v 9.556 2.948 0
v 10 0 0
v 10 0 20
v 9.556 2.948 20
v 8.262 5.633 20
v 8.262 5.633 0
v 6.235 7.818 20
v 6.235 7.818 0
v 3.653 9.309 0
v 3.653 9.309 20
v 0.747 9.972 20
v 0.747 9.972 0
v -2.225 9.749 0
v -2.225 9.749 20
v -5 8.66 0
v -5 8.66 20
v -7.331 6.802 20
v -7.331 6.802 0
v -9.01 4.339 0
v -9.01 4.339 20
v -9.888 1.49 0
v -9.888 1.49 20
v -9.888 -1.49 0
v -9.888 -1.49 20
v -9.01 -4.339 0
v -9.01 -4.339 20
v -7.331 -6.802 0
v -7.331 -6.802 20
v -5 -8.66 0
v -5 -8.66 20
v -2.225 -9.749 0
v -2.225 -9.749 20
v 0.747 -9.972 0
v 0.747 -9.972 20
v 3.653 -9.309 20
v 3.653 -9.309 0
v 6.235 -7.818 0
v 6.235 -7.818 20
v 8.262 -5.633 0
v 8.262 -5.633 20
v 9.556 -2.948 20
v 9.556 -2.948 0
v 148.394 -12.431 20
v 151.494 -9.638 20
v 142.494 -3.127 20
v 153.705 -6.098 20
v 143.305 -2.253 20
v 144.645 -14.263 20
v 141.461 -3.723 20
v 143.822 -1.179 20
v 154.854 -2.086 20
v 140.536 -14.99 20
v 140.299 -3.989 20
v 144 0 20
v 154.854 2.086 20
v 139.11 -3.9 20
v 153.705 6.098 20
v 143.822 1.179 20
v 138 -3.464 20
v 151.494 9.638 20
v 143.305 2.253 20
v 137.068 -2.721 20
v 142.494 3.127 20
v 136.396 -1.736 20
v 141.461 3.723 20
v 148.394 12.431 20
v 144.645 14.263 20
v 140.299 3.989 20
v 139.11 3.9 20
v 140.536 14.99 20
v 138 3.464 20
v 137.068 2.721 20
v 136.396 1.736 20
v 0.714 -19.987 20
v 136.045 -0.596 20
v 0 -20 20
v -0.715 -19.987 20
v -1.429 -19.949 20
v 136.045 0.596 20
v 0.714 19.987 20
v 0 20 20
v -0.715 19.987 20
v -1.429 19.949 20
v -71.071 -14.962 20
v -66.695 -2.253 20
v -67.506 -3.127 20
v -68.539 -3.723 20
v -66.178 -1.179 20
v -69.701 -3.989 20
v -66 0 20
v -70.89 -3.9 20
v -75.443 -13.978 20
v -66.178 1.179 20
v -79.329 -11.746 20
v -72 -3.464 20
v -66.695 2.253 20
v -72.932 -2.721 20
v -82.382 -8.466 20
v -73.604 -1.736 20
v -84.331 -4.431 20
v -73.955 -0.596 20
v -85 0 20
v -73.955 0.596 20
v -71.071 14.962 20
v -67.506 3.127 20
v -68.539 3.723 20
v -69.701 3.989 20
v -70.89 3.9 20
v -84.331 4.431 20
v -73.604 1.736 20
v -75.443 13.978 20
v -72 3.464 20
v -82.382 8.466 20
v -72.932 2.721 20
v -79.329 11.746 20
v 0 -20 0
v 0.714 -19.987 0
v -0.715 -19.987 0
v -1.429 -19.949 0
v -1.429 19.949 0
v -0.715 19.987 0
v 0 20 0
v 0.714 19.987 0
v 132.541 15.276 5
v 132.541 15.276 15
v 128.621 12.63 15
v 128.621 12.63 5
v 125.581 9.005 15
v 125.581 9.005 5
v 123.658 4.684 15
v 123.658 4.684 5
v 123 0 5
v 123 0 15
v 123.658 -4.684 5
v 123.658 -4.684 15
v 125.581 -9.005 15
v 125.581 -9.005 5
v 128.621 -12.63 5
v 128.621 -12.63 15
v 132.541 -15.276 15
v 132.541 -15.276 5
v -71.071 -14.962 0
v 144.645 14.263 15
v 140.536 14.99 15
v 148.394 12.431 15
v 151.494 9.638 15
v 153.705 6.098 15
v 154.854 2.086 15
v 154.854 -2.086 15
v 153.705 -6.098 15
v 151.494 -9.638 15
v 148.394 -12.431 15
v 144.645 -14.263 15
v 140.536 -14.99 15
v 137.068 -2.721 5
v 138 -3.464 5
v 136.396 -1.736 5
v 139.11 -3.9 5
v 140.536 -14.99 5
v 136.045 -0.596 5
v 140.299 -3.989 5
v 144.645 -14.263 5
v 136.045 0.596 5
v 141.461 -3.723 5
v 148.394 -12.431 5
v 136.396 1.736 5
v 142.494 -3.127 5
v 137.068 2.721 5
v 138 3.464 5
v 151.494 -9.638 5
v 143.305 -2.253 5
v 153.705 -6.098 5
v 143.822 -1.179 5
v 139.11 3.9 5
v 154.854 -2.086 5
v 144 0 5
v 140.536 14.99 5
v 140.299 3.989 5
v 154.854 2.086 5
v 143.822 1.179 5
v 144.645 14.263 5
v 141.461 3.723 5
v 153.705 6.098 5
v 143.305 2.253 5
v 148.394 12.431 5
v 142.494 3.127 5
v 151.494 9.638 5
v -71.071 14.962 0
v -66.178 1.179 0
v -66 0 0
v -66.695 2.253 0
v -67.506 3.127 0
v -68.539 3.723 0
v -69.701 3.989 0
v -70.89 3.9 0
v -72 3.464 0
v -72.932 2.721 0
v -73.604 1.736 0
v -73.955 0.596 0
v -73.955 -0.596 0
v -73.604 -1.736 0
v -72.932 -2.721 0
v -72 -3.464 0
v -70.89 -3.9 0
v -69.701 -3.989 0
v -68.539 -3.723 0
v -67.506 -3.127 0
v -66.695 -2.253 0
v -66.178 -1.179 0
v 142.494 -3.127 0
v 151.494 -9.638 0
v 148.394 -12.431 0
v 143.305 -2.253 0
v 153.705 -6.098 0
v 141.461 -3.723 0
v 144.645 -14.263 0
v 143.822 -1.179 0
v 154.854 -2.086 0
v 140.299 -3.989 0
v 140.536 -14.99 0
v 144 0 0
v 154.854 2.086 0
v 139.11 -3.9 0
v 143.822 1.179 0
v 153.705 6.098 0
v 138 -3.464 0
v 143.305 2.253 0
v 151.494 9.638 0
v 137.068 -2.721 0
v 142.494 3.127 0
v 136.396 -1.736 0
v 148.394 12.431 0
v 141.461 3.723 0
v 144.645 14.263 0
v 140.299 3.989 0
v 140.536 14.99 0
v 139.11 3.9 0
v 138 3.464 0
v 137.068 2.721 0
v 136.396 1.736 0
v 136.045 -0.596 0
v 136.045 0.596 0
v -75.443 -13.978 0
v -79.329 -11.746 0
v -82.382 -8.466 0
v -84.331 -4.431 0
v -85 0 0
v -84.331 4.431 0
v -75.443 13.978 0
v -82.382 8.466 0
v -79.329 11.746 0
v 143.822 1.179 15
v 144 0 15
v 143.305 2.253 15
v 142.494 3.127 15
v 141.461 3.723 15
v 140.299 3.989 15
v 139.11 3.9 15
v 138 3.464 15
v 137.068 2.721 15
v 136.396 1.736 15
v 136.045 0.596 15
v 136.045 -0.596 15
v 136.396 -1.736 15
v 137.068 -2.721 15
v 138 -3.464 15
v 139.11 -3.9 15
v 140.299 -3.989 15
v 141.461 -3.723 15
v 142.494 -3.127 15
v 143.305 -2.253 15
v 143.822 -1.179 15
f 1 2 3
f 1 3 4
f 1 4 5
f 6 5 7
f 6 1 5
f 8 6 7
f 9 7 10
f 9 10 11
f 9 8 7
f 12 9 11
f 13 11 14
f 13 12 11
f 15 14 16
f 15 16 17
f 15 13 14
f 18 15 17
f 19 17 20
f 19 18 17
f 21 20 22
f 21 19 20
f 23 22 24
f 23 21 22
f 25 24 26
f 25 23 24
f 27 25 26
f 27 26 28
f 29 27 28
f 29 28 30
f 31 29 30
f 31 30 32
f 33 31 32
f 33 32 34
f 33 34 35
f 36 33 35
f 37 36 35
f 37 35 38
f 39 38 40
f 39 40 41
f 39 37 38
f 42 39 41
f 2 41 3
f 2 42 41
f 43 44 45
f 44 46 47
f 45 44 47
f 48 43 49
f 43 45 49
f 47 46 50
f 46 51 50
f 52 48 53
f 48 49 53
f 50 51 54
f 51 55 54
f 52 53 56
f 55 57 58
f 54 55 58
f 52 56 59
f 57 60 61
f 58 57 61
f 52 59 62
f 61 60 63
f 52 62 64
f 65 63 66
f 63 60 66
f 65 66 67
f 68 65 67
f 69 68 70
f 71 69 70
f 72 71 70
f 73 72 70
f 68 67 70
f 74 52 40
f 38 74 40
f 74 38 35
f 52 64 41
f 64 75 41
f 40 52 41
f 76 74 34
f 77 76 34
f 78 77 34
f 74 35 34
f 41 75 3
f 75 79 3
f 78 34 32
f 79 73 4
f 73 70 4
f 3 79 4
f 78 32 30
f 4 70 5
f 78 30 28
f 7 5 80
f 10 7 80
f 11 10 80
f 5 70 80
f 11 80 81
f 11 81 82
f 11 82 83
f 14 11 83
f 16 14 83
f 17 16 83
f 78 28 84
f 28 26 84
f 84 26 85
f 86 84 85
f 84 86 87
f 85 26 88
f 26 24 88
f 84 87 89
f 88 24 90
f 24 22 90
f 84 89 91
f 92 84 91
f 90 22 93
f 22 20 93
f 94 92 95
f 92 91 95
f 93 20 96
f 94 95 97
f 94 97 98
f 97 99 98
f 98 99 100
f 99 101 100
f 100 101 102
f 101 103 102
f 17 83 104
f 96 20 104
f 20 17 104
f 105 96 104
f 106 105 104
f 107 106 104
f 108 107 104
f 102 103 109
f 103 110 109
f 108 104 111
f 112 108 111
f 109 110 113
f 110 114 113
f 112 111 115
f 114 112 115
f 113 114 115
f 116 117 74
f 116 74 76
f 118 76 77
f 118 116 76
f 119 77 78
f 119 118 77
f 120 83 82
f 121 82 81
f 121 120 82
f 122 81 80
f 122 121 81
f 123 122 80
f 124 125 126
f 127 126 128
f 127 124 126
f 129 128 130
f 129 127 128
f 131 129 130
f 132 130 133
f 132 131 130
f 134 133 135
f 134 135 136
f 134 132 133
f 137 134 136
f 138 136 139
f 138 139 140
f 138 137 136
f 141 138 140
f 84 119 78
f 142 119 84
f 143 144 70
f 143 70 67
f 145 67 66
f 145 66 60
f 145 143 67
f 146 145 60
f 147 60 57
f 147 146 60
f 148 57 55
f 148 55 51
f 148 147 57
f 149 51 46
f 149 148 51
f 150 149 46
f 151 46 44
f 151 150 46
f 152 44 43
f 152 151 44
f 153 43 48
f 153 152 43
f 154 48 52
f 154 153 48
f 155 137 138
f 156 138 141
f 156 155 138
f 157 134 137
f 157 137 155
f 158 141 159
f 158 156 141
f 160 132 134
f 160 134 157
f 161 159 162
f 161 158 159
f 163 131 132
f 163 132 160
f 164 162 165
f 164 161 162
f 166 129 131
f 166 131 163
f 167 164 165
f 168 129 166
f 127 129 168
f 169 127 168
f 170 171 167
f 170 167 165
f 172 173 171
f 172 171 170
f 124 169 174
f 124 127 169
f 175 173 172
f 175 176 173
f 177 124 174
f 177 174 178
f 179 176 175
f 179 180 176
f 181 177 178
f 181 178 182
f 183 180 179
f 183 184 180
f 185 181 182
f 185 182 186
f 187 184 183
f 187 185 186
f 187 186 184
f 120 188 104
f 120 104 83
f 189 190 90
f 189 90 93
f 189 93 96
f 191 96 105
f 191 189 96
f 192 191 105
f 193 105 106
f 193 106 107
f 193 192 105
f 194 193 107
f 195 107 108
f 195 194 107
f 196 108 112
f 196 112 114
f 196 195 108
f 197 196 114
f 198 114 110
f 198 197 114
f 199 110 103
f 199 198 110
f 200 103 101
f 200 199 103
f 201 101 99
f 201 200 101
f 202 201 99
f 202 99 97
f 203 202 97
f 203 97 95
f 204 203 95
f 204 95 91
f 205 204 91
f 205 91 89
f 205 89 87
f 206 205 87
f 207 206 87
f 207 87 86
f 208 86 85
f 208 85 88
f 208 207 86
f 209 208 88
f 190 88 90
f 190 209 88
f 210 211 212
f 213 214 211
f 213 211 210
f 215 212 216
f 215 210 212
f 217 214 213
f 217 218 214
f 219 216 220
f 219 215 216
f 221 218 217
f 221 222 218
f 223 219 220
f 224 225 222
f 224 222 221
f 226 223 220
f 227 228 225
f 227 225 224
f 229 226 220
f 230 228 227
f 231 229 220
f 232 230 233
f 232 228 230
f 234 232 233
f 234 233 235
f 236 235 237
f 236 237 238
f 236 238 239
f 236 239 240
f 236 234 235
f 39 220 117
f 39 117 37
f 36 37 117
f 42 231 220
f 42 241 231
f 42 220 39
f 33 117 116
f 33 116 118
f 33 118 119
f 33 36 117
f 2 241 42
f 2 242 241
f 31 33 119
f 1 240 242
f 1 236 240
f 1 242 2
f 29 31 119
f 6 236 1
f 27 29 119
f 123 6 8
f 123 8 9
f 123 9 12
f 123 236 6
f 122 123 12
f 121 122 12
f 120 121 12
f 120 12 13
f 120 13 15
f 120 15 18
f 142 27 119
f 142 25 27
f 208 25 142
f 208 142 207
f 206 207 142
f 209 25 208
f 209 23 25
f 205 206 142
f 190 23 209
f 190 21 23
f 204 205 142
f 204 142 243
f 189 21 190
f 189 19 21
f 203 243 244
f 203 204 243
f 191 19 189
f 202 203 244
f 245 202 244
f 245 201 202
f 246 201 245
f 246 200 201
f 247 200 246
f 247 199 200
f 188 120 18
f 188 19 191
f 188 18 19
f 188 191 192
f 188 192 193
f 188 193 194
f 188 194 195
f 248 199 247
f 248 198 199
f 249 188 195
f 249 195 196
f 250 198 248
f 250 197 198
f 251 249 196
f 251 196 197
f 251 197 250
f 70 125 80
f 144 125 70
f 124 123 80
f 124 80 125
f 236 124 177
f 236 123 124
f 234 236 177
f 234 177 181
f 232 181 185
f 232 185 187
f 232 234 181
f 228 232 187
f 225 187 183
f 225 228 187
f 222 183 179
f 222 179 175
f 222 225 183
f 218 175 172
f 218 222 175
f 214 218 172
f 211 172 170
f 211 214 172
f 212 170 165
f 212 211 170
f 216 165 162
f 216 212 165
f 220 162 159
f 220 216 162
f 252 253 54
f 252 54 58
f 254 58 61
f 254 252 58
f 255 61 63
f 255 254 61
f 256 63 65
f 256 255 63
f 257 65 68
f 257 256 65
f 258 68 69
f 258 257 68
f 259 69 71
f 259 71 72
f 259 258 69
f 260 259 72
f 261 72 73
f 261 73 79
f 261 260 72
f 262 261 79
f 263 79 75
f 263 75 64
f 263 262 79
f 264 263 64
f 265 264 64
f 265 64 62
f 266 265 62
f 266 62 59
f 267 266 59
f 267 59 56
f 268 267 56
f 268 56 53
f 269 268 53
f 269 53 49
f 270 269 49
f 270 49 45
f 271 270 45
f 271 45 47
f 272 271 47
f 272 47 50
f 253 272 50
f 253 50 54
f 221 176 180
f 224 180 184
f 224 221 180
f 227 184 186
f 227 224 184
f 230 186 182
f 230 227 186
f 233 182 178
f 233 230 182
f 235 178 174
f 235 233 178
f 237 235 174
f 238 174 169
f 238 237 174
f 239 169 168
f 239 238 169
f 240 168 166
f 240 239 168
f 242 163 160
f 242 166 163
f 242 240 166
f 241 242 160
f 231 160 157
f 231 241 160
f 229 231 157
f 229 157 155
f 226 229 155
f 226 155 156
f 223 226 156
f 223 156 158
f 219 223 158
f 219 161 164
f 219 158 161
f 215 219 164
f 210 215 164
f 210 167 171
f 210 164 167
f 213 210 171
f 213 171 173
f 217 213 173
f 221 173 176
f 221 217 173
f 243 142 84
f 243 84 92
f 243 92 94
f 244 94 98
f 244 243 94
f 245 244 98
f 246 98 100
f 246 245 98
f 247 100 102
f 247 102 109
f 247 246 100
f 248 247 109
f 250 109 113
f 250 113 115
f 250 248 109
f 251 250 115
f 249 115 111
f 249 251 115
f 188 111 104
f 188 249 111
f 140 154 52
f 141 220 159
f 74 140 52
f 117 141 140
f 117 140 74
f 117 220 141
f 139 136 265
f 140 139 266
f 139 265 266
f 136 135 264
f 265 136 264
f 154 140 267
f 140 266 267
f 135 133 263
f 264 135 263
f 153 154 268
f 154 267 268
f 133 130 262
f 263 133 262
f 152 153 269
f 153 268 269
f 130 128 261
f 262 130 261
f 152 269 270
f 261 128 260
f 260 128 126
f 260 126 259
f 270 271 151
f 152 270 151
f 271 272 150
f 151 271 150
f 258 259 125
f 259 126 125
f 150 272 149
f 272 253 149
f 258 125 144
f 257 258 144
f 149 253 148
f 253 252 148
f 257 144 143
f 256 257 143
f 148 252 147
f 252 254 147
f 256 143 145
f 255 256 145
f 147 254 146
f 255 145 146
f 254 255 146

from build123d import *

# Parameters (mm, degrees)
SKETCH_1_R          = 10
SKETCH_1_R_2        = 4
EXTRUDE_1_DEPTH     = 20
CUT_EXTRUDE_START   = 5
SKETCH_2_R          = 17
CUT_EXTRUDE_1_DEPTH = 10


with BuildPart() as part:
    # 草图1 → 凸台-拉伸1 (new body)
    with BuildSketch(Plane.XY):
        with BuildLine():
            Line((-71.071428571, 14.961685761), (-1.428571429, 19.948914348))
            ThreePointArc((-1.428571429, 19.948914348), (-0.357656609, 19.996801788), (0.714285714, 19.987240828))
            Line((0.714285714, 19.987240828), (140.535714286, 14.990430621))
            ThreePointArc((140.535714286, 14.990430621), (155, 0), (140.535714286, -14.990430621))
            Line((140.535714286, -14.990430621), (0.714285714, -19.987240828))
            ThreePointArc((0.714285714, -19.987240828), (-0.357656609, -19.996801788), (-1.428571429, -19.948914348))
            Line((-1.428571429, -19.948914348), (-71.071428571, -14.961685761))
            ThreePointArc((-71.071428571, -14.961685761), (-85, 0), (-71.071428571, 14.961685761))
        make_face()
        Circle(SKETCH_1_R, mode=Mode.SUBTRACT)
        with Locations((-70, 0)):
            Circle(SKETCH_1_R_2, mode=Mode.SUBTRACT)
        with Locations((140, 0)):
            Circle(SKETCH_1_R_2, mode=Mode.SUBTRACT)
    extrude(amount=EXTRUDE_1_DEPTH)

    # 草图2 → 切除-拉伸1 (cut)
    with BuildSketch(Plane.XY.offset(CUT_EXTRUDE_START)):
        with Locations((140, 0)):
            Circle(SKETCH_2_R)
    extrude(amount=CUT_EXTRUDE_1_DEPTH, mode=Mode.SUBTRACT)


solid = part.part
